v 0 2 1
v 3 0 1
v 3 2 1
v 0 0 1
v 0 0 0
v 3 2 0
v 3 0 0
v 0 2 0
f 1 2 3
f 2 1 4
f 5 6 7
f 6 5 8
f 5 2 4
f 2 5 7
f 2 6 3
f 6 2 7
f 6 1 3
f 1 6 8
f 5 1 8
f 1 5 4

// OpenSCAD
//Test do OpenScad
//Crtl+D = Comentar.
//Ctrl+shift+D = Descomentar.
$fn=200;//resolução do meu objeto.

rotate([$t*90,0,0])//rotacionando o x, mas também pode se rotacionar o y e o z.
cube([3,2,1]);
